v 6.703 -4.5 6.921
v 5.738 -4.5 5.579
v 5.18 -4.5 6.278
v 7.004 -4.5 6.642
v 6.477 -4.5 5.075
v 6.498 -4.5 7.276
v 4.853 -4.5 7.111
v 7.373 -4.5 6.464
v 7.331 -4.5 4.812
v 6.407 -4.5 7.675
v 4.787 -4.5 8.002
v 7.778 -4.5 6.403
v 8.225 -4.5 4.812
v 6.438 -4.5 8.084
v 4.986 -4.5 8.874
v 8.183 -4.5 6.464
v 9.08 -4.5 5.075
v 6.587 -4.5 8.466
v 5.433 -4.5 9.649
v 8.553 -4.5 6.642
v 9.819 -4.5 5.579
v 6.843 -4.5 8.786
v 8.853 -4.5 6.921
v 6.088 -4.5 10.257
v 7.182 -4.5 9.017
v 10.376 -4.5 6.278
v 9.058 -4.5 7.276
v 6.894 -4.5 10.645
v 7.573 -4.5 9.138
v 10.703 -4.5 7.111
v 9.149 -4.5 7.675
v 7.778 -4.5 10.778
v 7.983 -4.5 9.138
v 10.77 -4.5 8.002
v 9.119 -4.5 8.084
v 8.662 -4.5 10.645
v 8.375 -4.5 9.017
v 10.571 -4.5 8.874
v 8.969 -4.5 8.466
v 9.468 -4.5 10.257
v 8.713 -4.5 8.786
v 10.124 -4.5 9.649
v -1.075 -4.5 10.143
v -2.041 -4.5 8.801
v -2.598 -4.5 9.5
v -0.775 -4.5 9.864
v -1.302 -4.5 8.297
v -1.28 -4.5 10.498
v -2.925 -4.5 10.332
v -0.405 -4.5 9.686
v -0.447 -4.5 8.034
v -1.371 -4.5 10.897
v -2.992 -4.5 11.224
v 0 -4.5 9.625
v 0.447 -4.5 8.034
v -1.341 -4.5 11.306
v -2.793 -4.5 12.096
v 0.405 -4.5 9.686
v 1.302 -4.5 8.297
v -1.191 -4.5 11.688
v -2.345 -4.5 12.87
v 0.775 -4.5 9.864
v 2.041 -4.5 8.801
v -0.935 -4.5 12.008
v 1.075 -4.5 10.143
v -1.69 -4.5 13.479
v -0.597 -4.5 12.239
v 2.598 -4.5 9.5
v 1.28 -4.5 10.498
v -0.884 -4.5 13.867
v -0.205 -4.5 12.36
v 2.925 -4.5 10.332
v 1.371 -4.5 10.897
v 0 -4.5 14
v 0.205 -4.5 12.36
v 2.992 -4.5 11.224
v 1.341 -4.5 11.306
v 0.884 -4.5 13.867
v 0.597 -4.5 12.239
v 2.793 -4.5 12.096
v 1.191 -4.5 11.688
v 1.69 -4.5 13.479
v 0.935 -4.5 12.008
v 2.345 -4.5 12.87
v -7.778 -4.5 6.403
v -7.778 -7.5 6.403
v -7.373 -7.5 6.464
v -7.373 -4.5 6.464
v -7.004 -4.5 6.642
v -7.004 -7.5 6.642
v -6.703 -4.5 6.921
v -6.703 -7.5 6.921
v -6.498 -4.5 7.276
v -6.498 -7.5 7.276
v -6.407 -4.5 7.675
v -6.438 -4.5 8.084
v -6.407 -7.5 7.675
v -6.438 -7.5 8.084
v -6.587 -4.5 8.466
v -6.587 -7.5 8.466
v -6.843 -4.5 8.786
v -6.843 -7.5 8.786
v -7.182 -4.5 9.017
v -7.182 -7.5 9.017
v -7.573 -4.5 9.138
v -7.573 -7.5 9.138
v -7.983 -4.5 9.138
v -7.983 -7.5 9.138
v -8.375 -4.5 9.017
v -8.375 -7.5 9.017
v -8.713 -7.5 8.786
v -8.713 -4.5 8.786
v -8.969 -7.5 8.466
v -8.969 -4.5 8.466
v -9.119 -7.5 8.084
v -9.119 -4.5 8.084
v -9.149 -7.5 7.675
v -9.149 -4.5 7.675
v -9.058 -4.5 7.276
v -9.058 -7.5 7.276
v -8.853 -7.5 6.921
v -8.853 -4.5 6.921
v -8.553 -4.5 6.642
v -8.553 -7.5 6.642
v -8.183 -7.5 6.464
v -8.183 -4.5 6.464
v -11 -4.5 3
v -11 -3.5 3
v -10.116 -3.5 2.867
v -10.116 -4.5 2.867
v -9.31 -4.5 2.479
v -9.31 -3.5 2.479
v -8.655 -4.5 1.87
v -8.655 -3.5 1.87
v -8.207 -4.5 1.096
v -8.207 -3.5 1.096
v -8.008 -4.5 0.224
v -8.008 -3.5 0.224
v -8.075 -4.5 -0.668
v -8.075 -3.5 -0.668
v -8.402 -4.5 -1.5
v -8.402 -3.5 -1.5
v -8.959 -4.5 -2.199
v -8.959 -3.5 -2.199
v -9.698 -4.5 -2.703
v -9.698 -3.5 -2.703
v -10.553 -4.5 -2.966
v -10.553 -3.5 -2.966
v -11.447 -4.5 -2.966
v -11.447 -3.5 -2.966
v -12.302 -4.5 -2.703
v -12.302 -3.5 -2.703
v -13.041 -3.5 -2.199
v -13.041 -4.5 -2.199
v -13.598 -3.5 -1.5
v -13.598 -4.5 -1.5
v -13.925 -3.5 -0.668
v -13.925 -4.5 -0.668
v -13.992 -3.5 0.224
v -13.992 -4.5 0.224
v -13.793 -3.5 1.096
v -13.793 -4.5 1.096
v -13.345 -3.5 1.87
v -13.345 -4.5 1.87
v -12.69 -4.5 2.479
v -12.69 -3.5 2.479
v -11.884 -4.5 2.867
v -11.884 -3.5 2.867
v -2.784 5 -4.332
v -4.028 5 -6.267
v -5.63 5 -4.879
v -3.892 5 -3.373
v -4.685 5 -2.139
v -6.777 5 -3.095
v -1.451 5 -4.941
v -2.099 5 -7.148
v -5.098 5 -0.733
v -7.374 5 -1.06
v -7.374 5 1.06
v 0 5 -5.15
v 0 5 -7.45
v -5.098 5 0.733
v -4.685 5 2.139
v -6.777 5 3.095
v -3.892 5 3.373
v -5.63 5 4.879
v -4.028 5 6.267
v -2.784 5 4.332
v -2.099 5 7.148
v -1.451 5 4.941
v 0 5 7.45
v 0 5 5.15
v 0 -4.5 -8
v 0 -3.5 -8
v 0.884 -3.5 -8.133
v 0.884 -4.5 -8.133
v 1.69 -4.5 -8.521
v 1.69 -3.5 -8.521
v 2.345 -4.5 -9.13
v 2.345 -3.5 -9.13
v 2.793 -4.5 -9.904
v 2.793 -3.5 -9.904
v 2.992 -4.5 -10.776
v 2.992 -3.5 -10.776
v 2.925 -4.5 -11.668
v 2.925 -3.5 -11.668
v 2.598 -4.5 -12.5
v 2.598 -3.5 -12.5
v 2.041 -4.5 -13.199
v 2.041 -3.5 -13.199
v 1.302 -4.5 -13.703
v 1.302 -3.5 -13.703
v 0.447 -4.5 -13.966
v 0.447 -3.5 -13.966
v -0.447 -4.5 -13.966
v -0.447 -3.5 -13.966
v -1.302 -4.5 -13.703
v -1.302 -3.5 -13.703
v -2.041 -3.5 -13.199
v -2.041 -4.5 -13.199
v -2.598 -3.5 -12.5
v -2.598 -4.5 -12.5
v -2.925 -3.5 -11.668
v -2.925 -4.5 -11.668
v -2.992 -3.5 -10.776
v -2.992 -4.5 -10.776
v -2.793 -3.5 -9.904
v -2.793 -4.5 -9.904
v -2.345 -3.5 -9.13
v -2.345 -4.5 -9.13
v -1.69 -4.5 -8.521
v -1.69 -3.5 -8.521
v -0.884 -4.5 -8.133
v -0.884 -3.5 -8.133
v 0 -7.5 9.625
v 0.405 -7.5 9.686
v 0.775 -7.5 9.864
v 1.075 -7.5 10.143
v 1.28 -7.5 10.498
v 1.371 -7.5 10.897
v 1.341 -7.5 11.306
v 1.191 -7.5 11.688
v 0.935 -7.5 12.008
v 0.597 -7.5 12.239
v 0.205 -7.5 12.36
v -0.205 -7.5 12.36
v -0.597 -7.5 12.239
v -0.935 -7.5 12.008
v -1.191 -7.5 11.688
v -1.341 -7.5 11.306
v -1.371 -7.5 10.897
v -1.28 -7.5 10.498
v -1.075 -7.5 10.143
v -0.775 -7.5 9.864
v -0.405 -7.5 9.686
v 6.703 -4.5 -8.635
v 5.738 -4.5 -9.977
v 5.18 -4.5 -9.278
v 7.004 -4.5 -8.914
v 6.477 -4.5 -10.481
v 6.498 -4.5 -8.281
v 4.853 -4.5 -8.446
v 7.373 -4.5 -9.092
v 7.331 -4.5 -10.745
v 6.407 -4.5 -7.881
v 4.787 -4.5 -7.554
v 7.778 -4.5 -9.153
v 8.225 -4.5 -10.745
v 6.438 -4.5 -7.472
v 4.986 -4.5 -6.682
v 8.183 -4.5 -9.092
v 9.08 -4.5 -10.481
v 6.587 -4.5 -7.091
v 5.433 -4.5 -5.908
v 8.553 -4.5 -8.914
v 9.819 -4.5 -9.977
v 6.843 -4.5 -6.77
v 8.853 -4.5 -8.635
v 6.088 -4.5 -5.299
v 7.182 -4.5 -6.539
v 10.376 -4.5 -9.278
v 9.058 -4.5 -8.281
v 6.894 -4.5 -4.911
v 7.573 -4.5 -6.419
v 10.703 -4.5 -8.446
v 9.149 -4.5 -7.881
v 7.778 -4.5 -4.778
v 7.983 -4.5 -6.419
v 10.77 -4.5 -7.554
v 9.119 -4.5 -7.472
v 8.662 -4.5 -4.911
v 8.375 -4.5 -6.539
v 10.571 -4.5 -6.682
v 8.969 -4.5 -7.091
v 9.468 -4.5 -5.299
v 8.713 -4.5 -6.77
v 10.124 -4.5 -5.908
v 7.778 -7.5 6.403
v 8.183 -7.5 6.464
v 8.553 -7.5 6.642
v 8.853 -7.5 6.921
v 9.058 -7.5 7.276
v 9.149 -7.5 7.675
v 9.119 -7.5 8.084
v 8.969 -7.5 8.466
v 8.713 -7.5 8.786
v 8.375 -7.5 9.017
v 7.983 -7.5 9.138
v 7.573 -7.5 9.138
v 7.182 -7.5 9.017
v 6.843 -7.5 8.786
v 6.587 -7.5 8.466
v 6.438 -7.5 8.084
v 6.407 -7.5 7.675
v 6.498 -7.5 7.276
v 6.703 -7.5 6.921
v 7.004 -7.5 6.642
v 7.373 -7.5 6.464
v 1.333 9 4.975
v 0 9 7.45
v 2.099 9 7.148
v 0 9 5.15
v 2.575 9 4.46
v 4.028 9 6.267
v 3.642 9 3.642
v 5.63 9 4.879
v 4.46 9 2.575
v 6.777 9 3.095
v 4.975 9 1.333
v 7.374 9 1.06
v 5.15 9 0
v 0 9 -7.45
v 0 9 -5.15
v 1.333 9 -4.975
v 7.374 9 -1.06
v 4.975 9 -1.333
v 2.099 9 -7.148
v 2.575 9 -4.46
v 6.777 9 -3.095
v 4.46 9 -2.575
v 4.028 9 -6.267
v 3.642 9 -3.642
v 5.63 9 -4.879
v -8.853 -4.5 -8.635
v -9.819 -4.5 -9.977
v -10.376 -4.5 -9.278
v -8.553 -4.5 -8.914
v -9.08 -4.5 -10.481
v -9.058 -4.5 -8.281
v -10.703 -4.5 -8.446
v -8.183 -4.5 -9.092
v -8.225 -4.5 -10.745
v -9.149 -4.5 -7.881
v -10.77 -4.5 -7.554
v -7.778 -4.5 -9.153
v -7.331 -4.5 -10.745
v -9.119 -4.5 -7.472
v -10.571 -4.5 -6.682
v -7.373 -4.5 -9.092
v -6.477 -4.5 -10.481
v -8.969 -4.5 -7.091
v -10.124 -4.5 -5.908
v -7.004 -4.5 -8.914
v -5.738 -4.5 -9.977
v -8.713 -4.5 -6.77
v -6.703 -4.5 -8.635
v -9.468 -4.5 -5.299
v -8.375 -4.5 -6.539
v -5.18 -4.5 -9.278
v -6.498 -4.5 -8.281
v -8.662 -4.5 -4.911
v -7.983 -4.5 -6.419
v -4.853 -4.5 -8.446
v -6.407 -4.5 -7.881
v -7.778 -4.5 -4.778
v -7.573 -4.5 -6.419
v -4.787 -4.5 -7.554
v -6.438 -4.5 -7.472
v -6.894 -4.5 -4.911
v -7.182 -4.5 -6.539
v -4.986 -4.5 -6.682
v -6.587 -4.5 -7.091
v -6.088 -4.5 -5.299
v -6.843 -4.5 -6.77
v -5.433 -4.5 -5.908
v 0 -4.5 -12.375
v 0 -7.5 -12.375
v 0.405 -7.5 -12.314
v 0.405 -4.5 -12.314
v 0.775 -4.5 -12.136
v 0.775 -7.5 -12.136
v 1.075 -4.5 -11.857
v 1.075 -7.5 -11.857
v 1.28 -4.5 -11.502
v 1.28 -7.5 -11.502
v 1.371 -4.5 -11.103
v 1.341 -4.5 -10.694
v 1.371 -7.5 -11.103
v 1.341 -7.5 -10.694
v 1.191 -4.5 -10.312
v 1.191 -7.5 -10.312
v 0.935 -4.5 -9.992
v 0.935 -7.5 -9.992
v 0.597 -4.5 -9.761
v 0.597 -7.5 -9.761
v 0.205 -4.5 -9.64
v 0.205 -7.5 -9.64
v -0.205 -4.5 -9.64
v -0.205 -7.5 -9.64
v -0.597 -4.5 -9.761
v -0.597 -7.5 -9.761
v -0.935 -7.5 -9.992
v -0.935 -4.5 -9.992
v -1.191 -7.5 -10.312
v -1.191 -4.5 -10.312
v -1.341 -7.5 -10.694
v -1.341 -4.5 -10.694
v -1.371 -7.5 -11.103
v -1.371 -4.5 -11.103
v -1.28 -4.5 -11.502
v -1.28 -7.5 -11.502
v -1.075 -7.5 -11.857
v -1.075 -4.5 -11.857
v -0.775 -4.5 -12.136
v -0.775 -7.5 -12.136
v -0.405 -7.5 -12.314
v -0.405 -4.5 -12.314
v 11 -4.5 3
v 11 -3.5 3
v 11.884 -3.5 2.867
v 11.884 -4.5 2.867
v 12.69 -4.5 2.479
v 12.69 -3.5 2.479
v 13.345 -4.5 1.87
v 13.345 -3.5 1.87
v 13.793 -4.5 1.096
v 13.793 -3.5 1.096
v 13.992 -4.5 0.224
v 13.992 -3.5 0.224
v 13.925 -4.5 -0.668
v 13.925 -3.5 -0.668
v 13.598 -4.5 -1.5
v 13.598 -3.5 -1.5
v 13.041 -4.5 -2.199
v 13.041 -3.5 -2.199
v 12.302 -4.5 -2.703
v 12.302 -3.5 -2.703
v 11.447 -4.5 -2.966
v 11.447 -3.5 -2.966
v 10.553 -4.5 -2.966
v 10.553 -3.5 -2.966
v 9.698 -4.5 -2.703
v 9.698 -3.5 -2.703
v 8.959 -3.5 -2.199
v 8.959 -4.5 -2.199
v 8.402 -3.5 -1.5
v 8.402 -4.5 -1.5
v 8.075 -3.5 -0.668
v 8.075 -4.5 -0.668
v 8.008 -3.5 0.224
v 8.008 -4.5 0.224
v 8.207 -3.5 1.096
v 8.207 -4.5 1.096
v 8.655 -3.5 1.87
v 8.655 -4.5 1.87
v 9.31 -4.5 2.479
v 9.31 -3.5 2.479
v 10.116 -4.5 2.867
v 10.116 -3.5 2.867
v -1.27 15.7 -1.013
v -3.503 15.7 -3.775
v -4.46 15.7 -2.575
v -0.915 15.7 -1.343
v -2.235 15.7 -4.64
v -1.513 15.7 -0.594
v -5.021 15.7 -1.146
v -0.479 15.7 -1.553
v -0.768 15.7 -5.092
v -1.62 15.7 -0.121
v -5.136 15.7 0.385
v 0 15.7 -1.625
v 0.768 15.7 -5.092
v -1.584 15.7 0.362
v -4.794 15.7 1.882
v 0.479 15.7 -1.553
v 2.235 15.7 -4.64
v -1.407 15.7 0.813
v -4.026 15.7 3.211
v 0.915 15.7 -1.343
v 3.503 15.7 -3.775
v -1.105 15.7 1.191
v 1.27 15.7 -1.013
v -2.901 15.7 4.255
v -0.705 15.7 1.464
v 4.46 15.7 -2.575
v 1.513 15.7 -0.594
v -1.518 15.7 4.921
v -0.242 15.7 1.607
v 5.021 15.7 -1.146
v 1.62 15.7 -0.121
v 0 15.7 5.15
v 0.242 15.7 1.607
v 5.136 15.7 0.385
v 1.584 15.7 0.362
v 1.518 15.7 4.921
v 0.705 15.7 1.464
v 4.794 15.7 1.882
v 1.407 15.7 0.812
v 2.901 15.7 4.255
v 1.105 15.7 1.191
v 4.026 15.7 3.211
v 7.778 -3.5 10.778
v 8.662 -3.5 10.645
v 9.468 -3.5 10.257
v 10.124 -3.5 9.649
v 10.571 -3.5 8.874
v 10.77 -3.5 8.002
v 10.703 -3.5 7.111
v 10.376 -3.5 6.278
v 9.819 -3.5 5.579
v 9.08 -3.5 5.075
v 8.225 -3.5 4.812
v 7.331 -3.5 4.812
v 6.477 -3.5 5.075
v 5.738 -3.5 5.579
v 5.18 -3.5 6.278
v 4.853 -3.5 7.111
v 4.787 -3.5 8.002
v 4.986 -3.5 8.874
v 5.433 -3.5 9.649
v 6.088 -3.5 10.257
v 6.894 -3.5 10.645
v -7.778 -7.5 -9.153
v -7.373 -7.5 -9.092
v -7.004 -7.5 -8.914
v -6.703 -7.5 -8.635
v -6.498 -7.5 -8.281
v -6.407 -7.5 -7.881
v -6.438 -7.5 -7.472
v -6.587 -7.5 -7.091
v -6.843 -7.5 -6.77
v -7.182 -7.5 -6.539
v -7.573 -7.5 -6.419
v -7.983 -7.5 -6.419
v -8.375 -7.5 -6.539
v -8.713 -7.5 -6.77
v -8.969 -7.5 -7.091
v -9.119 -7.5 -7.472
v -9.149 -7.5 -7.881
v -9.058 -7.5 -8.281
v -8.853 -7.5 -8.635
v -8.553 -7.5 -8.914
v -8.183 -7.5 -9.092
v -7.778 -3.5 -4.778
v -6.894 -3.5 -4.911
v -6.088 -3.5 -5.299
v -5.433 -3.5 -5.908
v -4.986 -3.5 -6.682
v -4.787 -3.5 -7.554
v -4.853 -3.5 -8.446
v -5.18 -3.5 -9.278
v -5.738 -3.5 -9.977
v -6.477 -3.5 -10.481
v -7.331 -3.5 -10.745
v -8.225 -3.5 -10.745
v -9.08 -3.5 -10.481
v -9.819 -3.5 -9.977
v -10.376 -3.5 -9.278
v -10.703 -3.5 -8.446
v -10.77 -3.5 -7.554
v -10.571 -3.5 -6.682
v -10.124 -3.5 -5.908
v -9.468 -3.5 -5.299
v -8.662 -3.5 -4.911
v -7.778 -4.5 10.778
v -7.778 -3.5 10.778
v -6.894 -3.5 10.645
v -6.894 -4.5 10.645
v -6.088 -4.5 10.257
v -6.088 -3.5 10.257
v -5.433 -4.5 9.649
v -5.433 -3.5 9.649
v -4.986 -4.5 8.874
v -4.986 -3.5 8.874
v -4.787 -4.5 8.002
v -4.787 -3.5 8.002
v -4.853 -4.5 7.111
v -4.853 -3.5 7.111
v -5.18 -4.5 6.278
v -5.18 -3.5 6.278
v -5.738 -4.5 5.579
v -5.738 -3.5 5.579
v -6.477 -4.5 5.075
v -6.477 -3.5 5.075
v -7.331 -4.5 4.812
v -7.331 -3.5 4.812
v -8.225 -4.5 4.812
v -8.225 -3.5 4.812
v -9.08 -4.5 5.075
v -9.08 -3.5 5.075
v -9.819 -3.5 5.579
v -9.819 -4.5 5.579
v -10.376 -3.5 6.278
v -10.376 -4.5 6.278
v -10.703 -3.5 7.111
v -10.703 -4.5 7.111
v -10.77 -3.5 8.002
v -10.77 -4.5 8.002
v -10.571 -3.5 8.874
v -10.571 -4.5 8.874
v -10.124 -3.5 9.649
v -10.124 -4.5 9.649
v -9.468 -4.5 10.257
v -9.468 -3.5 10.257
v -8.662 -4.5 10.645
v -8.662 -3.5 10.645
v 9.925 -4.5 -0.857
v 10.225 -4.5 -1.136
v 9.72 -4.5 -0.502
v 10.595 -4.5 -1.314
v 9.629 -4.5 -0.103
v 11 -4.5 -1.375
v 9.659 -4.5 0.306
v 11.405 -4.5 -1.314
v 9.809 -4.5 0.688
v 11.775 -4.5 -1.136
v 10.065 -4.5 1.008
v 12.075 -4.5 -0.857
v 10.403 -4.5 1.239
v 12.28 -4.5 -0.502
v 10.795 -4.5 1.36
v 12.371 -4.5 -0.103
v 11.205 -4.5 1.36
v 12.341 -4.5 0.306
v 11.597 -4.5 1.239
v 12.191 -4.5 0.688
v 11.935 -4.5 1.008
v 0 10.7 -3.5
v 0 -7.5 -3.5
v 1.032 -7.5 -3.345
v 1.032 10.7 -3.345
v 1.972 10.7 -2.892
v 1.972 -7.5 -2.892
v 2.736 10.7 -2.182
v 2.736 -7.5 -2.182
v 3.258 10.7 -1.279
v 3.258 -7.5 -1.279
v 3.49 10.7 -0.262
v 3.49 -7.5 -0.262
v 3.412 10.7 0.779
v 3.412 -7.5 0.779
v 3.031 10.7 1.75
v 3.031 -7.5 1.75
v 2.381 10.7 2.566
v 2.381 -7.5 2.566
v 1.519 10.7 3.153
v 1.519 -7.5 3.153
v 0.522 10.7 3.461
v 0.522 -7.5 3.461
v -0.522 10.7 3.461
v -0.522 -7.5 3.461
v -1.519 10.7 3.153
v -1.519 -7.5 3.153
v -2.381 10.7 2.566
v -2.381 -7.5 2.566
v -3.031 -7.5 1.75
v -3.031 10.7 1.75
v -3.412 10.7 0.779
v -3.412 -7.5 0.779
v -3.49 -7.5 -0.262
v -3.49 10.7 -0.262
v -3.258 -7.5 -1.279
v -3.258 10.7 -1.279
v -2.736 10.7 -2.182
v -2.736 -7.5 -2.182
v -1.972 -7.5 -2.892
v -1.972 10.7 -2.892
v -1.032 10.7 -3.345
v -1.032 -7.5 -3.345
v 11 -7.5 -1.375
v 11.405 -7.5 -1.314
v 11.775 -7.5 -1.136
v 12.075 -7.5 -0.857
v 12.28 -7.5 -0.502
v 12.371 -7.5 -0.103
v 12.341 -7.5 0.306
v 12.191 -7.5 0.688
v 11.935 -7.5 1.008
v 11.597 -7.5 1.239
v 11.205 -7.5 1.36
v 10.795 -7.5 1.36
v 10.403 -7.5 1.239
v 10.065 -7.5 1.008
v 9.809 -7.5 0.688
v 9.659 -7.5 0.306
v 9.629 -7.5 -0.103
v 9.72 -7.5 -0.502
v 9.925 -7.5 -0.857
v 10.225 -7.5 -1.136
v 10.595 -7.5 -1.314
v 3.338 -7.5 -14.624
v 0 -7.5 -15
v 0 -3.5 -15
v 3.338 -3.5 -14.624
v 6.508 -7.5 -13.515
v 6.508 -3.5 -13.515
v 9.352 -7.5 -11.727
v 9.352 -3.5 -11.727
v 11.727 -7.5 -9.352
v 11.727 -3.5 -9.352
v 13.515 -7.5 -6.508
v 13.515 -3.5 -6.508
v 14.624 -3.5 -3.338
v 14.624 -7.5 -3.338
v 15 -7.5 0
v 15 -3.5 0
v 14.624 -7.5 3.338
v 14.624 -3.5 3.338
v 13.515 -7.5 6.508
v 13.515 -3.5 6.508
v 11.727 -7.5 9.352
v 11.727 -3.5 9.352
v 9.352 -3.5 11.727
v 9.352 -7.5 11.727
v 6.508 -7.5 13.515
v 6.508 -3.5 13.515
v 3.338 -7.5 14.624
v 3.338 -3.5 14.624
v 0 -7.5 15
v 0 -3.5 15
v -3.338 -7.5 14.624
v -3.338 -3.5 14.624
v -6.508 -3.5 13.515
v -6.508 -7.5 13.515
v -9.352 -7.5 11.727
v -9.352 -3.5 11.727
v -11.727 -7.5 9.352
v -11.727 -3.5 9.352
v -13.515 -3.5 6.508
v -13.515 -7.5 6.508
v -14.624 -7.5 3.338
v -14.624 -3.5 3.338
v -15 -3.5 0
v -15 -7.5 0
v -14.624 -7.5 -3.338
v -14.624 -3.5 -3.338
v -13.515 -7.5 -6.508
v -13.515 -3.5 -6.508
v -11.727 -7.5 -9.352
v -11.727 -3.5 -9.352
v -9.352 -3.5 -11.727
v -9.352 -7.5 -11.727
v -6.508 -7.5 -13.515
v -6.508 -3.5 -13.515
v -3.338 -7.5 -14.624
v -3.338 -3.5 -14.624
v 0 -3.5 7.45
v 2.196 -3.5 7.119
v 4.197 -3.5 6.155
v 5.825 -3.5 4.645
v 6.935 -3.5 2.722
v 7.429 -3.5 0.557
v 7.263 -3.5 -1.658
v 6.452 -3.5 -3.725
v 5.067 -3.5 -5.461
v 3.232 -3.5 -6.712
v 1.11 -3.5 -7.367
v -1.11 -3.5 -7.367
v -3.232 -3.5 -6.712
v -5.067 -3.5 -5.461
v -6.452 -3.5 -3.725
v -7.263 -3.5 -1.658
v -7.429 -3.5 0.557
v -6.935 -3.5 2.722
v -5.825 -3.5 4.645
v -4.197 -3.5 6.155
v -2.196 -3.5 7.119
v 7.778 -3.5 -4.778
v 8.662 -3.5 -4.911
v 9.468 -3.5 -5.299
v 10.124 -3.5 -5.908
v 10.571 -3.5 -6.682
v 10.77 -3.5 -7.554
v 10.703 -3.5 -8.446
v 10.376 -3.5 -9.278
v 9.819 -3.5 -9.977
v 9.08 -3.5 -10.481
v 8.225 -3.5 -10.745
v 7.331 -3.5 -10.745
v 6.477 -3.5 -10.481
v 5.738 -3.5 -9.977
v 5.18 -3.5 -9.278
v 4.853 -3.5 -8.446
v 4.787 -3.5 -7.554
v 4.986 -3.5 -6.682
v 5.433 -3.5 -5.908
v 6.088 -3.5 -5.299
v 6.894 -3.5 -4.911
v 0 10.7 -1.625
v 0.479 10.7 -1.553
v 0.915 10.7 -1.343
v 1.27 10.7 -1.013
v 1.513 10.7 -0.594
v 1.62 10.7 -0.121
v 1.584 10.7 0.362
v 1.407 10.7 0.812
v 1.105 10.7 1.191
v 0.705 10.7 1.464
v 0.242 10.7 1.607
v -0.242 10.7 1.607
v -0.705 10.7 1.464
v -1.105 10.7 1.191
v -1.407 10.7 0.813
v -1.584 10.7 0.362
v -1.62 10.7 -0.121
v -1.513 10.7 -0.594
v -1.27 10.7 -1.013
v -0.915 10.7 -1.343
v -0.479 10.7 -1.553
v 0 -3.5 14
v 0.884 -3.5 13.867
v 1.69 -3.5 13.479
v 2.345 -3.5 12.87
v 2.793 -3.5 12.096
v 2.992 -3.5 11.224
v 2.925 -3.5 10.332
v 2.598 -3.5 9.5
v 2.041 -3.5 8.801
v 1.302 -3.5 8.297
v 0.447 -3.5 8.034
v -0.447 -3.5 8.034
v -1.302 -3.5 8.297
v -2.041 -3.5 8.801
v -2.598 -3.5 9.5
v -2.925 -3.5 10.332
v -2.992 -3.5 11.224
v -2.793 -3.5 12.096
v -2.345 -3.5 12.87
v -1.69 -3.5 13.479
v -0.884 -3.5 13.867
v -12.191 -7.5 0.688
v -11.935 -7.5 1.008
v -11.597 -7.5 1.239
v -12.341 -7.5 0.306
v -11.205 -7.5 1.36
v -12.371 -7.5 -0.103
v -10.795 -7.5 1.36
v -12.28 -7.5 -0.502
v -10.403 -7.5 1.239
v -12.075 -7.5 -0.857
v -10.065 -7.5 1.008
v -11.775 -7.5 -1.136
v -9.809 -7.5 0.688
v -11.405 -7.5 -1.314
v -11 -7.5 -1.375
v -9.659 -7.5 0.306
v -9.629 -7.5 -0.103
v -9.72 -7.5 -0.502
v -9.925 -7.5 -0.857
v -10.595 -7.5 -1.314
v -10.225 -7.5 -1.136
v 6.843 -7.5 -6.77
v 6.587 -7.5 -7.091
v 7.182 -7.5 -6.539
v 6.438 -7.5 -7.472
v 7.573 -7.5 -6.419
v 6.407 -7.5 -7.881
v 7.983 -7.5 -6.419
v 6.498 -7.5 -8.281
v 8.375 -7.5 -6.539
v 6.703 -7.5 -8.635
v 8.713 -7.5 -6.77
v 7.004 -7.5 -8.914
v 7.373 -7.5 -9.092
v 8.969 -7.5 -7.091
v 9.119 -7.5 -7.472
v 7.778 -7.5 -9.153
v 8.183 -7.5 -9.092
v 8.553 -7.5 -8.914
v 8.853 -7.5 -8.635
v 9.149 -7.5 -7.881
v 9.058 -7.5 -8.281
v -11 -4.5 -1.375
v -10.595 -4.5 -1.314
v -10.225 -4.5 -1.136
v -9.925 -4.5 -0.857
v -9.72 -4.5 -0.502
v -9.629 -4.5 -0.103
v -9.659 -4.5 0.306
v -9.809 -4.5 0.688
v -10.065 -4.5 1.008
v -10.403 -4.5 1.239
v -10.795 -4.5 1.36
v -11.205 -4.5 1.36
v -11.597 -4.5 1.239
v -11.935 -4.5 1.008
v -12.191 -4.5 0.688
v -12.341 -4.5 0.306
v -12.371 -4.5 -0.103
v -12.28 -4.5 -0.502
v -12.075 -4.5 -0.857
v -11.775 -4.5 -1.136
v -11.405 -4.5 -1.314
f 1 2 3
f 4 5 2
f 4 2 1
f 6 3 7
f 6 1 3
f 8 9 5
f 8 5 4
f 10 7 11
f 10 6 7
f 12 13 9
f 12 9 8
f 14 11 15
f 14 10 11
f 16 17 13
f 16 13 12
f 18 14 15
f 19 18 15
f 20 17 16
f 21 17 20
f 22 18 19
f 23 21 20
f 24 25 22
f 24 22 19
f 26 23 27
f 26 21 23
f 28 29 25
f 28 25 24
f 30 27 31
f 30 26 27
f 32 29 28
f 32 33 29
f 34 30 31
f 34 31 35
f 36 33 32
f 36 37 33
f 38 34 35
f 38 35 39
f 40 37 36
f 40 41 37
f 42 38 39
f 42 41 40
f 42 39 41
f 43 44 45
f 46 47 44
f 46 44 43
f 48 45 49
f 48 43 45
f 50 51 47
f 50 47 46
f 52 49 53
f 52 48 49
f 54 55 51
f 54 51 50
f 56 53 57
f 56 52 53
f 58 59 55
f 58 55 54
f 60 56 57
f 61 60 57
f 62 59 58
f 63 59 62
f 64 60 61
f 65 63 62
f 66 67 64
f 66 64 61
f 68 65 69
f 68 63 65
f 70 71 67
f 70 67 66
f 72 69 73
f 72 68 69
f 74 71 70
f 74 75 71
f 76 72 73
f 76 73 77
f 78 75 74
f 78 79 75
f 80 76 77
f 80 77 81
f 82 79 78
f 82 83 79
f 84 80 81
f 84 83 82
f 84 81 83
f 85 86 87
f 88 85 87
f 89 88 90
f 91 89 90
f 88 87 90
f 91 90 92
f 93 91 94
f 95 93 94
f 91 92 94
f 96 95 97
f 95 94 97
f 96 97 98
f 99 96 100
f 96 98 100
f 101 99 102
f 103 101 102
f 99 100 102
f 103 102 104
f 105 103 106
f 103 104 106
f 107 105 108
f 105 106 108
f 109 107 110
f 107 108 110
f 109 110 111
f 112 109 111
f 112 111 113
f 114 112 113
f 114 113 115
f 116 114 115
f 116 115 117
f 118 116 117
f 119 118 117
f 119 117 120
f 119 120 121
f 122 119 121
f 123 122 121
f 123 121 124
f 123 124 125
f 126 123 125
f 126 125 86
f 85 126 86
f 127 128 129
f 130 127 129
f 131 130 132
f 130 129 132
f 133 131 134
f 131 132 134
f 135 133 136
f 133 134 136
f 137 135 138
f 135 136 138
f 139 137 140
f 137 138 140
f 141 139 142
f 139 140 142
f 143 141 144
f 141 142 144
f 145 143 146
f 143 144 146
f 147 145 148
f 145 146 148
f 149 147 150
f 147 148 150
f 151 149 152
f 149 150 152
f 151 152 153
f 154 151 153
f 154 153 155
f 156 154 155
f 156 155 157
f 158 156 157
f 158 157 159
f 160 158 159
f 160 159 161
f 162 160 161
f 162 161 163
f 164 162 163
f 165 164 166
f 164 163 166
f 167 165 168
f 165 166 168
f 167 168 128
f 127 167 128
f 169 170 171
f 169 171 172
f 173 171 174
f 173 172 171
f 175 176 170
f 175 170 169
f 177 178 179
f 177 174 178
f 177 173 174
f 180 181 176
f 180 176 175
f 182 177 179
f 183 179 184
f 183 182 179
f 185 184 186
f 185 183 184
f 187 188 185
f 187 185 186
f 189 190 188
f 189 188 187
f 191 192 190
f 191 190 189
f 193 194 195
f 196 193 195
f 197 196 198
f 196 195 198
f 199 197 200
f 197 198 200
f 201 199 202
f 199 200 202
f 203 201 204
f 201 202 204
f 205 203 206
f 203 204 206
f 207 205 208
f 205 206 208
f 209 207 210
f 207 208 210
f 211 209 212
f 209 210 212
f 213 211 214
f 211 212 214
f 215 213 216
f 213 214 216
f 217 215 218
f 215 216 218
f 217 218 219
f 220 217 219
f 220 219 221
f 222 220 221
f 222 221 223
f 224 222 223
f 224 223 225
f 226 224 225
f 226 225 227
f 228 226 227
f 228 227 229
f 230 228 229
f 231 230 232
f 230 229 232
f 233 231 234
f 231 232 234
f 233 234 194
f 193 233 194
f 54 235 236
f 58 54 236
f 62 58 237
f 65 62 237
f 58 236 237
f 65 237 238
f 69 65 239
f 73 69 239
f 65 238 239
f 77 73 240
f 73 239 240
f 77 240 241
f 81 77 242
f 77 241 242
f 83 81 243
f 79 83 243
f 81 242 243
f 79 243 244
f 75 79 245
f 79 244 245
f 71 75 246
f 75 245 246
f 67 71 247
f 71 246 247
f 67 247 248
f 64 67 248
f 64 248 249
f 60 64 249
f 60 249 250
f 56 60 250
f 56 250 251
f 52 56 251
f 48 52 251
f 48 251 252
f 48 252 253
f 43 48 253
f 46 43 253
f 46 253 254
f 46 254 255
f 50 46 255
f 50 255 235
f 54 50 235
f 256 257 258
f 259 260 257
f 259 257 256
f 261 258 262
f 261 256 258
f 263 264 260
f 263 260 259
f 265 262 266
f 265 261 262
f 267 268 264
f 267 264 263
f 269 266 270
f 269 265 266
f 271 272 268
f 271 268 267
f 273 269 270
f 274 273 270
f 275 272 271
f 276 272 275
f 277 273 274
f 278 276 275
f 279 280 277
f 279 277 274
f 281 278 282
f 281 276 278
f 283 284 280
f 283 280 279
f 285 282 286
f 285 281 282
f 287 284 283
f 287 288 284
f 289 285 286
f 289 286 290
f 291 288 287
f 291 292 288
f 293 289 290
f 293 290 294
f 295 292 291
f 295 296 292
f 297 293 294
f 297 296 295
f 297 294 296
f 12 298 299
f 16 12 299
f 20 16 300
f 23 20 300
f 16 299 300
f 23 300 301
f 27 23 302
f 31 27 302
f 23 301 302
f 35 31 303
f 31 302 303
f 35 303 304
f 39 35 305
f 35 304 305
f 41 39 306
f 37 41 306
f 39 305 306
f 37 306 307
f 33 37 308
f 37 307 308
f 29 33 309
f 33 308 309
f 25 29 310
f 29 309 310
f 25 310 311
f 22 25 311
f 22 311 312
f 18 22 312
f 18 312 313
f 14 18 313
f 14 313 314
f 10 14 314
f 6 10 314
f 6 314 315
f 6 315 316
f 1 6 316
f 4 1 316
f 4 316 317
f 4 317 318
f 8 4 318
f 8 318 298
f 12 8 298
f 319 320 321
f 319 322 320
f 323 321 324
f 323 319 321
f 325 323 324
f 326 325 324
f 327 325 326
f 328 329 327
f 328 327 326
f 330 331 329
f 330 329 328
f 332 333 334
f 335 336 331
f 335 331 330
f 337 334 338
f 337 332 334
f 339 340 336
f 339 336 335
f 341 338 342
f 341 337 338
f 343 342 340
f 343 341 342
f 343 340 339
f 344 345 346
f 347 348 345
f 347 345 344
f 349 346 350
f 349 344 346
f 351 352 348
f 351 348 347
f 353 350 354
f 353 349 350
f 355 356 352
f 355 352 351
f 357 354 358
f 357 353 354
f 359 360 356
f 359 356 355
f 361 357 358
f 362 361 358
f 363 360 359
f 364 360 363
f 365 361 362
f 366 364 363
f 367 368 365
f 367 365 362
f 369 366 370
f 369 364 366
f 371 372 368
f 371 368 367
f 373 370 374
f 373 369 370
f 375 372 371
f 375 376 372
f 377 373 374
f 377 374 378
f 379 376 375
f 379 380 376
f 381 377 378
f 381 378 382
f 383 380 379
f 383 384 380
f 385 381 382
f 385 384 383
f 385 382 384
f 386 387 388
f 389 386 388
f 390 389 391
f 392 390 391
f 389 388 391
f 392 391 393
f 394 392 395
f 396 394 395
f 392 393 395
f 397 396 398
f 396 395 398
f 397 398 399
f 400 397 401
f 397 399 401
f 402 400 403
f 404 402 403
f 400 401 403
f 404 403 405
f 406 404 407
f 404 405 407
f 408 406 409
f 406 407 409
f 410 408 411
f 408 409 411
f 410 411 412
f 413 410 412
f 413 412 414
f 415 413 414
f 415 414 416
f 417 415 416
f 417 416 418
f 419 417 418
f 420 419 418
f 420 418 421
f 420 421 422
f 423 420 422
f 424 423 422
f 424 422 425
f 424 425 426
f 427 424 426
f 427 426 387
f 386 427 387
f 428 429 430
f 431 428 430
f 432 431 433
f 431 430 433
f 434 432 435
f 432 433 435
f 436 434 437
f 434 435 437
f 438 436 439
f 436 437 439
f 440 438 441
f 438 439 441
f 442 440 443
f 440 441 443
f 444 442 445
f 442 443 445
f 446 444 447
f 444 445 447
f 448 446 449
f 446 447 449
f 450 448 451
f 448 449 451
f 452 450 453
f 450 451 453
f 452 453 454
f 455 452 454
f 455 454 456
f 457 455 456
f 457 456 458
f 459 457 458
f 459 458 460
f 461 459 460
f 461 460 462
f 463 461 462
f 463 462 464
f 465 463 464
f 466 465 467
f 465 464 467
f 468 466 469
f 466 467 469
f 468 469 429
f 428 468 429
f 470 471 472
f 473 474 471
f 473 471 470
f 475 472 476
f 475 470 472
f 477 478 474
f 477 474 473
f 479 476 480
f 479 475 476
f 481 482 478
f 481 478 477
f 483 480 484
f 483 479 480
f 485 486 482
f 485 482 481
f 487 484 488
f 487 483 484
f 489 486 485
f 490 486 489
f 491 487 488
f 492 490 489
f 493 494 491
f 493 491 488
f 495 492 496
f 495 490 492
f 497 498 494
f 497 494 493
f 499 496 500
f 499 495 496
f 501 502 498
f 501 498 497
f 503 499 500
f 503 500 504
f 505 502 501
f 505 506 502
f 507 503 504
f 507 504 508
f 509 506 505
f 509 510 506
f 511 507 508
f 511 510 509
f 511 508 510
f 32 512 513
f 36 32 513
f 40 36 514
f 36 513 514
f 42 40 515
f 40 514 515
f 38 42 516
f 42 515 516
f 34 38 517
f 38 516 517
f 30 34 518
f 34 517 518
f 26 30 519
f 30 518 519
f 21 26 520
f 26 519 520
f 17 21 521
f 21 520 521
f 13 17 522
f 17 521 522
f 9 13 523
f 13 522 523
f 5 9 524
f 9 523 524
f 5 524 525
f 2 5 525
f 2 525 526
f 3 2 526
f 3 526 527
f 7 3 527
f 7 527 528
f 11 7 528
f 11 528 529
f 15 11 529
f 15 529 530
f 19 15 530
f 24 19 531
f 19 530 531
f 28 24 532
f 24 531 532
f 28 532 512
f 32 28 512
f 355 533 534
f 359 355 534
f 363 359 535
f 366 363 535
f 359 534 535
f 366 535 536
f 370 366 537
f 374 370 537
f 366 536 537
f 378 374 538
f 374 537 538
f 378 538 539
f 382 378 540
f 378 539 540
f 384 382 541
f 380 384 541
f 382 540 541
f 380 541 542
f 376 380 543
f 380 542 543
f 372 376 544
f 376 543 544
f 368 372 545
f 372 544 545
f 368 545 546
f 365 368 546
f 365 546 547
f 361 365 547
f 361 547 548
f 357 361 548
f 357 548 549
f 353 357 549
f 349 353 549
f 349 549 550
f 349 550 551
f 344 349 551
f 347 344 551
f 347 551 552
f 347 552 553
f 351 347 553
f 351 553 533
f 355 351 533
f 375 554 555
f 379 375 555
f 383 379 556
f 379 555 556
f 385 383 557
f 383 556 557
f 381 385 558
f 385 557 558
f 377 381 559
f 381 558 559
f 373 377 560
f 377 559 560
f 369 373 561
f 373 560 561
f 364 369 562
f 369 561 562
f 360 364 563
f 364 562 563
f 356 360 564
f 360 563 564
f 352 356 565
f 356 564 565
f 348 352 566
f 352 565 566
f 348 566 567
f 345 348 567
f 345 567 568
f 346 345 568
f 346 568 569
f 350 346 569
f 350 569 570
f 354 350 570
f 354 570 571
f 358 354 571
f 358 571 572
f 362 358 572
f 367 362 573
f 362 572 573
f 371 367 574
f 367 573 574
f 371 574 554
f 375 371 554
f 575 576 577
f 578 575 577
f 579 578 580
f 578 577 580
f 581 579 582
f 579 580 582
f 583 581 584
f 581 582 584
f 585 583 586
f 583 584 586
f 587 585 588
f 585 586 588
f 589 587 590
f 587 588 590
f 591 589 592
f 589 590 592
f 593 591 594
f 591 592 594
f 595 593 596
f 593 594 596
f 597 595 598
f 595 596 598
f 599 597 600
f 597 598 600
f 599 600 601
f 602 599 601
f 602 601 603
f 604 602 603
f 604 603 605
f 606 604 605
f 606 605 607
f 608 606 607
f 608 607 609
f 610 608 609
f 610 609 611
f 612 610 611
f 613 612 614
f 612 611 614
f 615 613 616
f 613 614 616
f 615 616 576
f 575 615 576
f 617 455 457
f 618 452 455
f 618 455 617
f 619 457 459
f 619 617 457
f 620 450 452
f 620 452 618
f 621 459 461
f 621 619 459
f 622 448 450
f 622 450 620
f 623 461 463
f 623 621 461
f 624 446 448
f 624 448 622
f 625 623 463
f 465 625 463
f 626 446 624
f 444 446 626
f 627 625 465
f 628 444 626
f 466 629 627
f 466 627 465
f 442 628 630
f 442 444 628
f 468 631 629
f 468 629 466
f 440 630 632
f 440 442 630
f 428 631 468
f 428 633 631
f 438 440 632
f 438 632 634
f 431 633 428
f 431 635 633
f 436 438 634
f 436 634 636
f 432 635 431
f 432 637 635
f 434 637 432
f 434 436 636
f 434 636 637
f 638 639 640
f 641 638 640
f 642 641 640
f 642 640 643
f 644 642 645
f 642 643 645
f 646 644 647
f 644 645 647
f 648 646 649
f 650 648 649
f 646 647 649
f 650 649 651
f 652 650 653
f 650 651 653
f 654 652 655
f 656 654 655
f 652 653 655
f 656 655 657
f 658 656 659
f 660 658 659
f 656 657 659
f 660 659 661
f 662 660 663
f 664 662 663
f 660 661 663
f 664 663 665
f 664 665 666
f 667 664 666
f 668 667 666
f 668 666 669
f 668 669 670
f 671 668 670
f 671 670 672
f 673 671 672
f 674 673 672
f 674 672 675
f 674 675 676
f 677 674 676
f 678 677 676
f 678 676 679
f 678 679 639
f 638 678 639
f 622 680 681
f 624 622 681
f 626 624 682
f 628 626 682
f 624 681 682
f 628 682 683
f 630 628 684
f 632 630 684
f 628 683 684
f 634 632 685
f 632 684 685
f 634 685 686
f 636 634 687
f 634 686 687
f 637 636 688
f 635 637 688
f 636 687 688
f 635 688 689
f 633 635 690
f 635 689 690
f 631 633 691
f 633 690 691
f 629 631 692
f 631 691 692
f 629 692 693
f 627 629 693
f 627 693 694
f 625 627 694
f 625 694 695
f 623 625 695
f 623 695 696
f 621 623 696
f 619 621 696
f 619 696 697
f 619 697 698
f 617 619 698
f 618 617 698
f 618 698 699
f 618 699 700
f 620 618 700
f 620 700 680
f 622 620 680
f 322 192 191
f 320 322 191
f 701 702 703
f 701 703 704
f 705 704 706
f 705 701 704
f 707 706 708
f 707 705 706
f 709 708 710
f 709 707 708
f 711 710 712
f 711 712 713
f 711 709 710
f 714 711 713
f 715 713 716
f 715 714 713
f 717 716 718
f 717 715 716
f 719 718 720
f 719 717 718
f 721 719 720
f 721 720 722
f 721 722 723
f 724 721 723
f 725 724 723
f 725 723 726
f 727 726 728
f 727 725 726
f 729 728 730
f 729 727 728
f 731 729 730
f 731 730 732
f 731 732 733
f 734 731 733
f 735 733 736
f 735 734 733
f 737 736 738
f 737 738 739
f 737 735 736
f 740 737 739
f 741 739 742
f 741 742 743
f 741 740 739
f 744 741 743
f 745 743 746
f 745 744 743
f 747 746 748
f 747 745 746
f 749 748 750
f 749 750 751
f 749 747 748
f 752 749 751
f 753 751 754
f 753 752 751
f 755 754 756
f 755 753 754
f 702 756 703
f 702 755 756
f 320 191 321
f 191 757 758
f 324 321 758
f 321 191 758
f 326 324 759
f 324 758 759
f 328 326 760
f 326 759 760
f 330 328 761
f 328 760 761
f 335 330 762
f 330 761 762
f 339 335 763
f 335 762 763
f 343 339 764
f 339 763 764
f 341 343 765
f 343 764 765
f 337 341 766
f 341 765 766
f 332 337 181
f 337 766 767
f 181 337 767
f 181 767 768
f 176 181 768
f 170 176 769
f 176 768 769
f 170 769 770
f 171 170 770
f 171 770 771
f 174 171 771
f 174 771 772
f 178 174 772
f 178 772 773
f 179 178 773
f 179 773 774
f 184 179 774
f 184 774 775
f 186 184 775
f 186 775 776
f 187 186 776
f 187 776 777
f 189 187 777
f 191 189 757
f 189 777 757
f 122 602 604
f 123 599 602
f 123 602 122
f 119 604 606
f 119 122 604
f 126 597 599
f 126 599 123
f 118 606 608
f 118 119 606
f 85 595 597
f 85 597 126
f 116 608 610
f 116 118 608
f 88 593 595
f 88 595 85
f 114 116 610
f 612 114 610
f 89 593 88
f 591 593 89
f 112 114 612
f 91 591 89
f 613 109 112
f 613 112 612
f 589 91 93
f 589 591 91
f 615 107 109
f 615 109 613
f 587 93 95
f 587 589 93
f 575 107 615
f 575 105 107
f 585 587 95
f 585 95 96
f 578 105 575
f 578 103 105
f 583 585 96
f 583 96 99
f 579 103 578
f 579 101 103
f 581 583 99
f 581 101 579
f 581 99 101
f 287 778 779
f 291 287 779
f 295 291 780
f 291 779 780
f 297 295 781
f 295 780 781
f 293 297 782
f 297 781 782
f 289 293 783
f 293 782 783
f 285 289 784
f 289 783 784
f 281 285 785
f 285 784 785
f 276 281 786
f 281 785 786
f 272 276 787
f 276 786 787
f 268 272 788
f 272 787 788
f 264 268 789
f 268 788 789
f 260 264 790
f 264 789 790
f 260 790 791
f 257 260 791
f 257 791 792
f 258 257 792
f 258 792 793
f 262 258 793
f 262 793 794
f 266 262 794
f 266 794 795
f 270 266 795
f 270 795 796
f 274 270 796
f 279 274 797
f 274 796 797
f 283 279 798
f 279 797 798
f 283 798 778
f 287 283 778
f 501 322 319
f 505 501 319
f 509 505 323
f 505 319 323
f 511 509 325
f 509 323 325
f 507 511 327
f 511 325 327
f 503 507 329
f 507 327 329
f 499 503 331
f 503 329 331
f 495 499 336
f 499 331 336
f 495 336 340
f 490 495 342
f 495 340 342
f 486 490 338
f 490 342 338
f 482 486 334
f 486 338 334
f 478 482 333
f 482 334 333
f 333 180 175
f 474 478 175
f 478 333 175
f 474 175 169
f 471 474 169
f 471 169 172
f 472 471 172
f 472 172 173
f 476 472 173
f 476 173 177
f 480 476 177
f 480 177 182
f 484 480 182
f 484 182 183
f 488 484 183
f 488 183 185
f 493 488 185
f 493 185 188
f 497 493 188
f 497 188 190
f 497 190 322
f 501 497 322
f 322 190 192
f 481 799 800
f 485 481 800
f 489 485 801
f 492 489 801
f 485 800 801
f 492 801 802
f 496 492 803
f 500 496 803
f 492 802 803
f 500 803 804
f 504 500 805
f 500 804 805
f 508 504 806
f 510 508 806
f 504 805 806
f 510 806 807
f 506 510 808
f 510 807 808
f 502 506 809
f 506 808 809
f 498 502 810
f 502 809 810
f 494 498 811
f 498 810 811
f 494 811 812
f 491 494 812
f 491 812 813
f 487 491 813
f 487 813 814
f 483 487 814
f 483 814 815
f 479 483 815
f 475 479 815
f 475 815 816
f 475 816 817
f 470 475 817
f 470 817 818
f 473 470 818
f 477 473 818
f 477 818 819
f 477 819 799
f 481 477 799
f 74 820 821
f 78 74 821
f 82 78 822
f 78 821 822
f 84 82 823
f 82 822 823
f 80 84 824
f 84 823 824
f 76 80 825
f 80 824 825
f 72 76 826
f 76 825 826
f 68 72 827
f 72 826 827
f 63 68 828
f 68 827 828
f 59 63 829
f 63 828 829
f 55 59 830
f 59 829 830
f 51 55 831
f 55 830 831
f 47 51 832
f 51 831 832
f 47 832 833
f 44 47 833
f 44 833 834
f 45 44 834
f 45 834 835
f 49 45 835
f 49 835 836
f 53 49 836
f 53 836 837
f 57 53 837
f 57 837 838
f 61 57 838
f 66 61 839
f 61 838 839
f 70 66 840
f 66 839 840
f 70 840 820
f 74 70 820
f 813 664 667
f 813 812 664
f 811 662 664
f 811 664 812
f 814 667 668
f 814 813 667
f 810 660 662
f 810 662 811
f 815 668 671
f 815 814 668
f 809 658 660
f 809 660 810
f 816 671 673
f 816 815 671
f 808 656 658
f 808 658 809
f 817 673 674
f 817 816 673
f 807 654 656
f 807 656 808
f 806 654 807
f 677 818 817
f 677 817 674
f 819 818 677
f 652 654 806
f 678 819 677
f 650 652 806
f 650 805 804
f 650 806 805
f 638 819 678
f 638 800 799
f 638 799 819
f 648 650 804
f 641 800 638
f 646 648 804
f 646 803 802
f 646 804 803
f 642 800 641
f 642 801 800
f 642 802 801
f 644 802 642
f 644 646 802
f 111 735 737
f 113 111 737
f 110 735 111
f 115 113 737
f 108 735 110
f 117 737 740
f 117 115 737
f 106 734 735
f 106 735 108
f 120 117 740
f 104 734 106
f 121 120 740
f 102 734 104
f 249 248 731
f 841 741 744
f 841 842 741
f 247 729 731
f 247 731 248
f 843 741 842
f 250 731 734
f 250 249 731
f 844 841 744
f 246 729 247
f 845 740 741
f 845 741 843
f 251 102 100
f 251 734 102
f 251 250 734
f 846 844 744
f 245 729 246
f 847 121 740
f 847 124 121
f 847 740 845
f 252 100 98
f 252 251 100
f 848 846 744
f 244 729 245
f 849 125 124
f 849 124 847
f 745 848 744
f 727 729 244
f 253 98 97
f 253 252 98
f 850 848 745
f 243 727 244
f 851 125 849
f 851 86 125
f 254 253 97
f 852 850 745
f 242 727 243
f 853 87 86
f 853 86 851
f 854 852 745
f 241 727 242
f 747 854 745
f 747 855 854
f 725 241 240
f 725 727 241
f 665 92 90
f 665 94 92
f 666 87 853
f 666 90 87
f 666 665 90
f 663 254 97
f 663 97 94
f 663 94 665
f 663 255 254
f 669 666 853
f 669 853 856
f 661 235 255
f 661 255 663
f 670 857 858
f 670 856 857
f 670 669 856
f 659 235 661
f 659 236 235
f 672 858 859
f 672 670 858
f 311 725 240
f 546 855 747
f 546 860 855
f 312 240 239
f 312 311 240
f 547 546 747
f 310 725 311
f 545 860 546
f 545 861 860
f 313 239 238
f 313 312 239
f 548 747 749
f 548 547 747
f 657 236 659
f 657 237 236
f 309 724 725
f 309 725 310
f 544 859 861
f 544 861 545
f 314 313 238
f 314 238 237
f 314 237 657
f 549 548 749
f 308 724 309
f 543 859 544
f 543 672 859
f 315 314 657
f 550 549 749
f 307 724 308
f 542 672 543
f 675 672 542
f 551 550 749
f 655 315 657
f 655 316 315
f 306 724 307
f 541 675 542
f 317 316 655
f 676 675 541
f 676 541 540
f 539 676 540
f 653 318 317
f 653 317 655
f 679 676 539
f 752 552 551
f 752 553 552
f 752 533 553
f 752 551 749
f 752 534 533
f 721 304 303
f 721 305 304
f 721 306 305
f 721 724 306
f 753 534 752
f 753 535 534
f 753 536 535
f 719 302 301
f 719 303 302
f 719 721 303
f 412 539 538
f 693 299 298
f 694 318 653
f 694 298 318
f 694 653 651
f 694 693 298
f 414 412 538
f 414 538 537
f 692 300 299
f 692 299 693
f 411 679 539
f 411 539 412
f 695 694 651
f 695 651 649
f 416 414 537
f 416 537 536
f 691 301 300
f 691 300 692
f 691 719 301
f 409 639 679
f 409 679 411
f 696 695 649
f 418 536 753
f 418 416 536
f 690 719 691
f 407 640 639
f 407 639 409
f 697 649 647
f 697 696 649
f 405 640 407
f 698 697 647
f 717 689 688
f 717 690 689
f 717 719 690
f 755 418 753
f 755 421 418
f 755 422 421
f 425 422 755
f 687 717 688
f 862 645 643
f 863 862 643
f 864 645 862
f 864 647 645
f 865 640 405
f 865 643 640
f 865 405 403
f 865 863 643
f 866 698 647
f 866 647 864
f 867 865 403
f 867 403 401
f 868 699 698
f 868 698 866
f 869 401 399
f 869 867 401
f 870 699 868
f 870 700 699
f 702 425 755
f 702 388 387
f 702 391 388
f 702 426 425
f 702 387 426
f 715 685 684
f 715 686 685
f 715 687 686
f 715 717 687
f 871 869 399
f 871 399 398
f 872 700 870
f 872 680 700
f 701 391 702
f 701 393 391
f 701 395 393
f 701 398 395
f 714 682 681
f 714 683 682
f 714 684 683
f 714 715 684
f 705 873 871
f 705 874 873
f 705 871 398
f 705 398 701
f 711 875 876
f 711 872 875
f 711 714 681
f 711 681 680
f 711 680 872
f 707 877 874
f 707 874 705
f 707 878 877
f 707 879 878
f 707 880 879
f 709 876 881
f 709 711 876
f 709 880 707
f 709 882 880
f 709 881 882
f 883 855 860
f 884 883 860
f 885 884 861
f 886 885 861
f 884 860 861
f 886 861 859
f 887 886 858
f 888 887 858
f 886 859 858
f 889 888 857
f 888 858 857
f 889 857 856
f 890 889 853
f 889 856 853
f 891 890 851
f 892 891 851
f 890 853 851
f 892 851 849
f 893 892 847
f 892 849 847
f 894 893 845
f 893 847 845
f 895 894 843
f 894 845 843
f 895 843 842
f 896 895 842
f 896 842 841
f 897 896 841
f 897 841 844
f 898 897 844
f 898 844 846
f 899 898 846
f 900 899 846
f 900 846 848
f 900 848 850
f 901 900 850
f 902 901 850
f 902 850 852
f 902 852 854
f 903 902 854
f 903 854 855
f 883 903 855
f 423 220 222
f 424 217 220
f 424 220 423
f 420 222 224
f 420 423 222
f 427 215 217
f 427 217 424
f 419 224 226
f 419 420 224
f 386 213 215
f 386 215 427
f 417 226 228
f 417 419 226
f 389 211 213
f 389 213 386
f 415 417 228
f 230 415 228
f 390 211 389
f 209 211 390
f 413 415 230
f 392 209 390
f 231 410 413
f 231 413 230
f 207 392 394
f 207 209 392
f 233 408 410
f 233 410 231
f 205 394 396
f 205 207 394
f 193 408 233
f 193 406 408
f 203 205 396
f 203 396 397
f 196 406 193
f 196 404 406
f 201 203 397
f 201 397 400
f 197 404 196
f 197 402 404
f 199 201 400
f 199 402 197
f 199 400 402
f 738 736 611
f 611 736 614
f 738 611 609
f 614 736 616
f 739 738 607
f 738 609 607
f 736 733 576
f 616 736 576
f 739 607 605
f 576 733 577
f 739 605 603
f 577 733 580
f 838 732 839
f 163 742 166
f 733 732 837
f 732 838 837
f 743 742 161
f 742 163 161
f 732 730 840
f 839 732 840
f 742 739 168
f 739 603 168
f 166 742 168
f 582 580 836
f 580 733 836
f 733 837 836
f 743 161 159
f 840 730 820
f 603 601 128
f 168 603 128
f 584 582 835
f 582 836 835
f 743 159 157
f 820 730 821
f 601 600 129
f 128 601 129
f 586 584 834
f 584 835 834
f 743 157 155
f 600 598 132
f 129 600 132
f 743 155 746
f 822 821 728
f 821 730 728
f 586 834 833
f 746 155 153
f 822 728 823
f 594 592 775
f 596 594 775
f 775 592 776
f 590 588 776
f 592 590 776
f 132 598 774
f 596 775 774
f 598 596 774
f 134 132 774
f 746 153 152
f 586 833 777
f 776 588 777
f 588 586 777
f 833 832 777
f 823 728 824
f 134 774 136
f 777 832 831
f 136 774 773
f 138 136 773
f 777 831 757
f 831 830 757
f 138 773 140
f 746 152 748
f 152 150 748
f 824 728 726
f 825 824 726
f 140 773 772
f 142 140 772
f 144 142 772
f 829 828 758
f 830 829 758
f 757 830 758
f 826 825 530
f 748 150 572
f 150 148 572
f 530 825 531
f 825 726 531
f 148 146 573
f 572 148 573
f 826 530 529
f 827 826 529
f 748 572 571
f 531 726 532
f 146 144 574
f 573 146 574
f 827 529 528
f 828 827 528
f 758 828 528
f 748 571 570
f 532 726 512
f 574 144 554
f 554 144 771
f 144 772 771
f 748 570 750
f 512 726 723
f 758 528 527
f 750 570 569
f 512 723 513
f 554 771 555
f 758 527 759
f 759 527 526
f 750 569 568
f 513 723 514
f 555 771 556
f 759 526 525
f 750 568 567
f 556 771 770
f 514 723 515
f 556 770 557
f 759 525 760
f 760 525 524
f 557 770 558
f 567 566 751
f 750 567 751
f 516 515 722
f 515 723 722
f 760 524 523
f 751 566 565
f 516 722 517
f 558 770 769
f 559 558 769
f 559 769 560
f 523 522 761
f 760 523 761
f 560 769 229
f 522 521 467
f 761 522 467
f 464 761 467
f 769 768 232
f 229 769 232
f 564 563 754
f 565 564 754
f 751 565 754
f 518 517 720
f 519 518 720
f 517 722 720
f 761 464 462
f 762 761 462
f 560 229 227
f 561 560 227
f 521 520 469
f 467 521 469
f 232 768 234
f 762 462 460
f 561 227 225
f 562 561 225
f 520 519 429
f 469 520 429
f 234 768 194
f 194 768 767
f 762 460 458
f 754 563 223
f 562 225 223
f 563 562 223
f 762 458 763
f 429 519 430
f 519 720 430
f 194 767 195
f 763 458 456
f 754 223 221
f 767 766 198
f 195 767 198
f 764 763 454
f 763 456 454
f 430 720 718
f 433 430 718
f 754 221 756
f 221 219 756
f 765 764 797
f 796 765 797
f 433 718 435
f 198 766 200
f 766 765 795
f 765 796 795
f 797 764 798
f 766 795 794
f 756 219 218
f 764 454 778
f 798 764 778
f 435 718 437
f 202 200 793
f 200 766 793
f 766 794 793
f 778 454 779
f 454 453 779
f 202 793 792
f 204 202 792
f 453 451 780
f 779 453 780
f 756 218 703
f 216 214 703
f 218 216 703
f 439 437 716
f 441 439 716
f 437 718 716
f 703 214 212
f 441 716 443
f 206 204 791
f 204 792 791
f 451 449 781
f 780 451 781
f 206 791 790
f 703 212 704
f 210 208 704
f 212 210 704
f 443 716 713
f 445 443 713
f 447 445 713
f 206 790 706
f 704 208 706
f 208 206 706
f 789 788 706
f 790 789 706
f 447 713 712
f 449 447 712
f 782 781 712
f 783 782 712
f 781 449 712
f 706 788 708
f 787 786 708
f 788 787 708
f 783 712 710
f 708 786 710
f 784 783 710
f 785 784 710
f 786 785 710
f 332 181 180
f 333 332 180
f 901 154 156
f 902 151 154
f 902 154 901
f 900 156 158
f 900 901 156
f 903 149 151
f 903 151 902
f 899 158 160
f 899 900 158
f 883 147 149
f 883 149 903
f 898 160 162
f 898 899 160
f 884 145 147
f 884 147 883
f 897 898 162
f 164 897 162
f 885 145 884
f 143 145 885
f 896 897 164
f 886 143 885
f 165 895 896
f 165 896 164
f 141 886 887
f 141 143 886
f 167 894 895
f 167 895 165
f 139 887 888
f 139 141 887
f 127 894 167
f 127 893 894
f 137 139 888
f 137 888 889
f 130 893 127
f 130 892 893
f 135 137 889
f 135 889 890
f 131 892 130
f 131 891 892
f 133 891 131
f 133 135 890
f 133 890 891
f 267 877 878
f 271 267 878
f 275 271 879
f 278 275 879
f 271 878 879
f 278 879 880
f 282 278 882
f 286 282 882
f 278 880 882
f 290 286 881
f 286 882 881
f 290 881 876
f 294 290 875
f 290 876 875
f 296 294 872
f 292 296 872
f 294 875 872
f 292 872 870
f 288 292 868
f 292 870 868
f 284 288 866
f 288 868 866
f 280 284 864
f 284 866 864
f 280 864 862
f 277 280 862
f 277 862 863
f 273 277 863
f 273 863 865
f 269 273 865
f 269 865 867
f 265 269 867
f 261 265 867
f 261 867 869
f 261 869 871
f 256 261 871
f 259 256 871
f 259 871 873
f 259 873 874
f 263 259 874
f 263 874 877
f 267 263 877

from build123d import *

# Parameters (mm, degrees)
SKETCH1_R           = 7.5
BOSS_EXTRUDE1_DEPTH = 5
SKETCH1_3_R         = 5.15
BOSS_EXTRUDE2_DEPTH = 15.7
BOSS_EXTRUDE3_DEPTH = 4
SKETCH3_R           = 1.625
CUT_EXTRUDE1_DEPTH  = 37
SKETCH4_R           = 3.5
CUT_EXTRUDE2_DEPTH  = 10.7
BOSS_EXTRUDE4_START = 3.5
SKETCH5_R           = 7.5
SKETCH5_R_2         = 3.5
BOSS_EXTRUDE4_DEPTH = 3.5
BOSS_EXTRUDE5_START = 4
SKETCH6_R           = 15
SKETCH6_R_2         = 1.375
SKETCH6_R_3         = 3.5
BOSS_EXTRUDE5_DEPTH = 4
SKETCH7_R           = 3
CUT_EXTRUDE3_DEPTH  = 1
CUT_EXTRUDE4_START  = -12.5
SKETCH8_R           = 7.5
SKETCH8_R_2         = 7.45
CUT_EXTRUDE4_DEPTH  = 12.5


with BuildPart() as part:
    # Sketch1 → Boss-Extrude1 (new body)
    with BuildSketch(Plane(origin=(0, 0, 0), x_dir=(1, 0, 0), z_dir=(0, 1, 0))):
        Circle(SKETCH1_R)
    extrude(amount=BOSS_EXTRUDE1_DEPTH)

    # Sketch1<3> → Boss-Extrude2 (add)
    with BuildSketch(Plane(origin=(0, 0, 0), x_dir=(1, 0, 0), z_dir=(0, 1, 0))):
        Circle(SKETCH1_3_R)
    extrude(amount=BOSS_EXTRUDE2_DEPTH)

    # Sketch2 → Boss-Extrude3 (add)
    with BuildSketch(Plane(origin=(0, 5, 0), x_dir=(1, 0, 0), z_dir=(0, 1, 0))):
        with BuildLine():
            ThreePointArc((7.5, 0), (5.303300859, 5.303300859), (0, 7.5))
            Line((0, 7.5), (0, 5.15))
            ThreePointArc((0, 5.15), (3.641599923, 3.641599923), (5.15, 0))
            ThreePointArc((5.15, 0), (3.641599923, -3.641599923), (0, -5.15))
            Line((0, -5.15), (0, -7.5))
            ThreePointArc((0, -7.5), (5.303300859, -5.303300859), (7.5, 0))
        make_face()
    extrude(amount=BOSS_EXTRUDE3_DEPTH)

    # Sketch3 → Cut-Extrude1 (cut)
    with BuildSketch(Plane.XZ):
        Circle(SKETCH3_R)
    extrude(amount=-CUT_EXTRUDE1_DEPTH, mode=Mode.SUBTRACT)

    # Sketch4 → Cut-Extrude2 (cut)
    with BuildSketch(Plane.XZ):
        Circle(SKETCH4_R)
    extrude(amount=-CUT_EXTRUDE2_DEPTH, mode=Mode.SUBTRACT)

    # Sketch5 → Boss-Extrude4 (add)
    with BuildSketch(Plane.XZ.offset(BOSS_EXTRUDE4_START)):
        Circle(SKETCH5_R)
        Circle(SKETCH5_R_2, mode=Mode.SUBTRACT)
    extrude(amount=-BOSS_EXTRUDE4_DEPTH)

    # Sketch6 → Boss-Extrude5 (add)
    with BuildSketch(Plane.XZ.offset(3.5).offset(BOSS_EXTRUDE5_START)):
        Circle(SKETCH6_R)
        with Locations((11, 0)):
            Circle(SKETCH6_R_2, mode=Mode.SUBTRACT)
        with Locations((7.778174593, -7.778174593)):
            Circle(SKETCH6_R_2, mode=Mode.SUBTRACT)
        with Locations((0, -11)):
            Circle(SKETCH6_R_2, mode=Mode.SUBTRACT)
        with Locations((-7.778174593, -7.778174593)):
            Circle(SKETCH6_R_2, mode=Mode.SUBTRACT)
        with Locations((-11, 0)):
            Circle(SKETCH6_R_2, mode=Mode.SUBTRACT)
        with Locations((-7.778174593, 7.778174593)):
            Circle(SKETCH6_R_2, mode=Mode.SUBTRACT)
        with Locations((0, 11)):
            Circle(SKETCH6_R_2, mode=Mode.SUBTRACT)
        with Locations((7.778174593, 7.778174593)):
            Circle(SKETCH6_R_2, mode=Mode.SUBTRACT)
        Circle(SKETCH6_R_3, mode=Mode.SUBTRACT)
    extrude(amount=-BOSS_EXTRUDE5_DEPTH)

    # Sketch7 → Cut-Extrude3 (cut)
    with BuildSketch(Plane(origin=(0, -3.5, 0), x_dir=(1, 0, 0), z_dir=(0, 1, 0))):
        with Locations((-11, 0)):
            Circle(SKETCH7_R)
        with Locations((-7.778174593, 7.778174593)):
            Circle(SKETCH7_R)
        with Locations((0, 11)):
            Circle(SKETCH7_R)
        with Locations((7.778174593, 7.778174593)):
            Circle(SKETCH7_R)
        with Locations((11, 0)):
            Circle(SKETCH7_R)
        with Locations((7.778174593, -7.778174593)):
            Circle(SKETCH7_R)
        with Locations((0, -11)):
            Circle(SKETCH7_R)
        with Locations((-7.778174593, -7.778174593)):
            Circle(SKETCH7_R)
    extrude(amount=-CUT_EXTRUDE3_DEPTH, mode=Mode.SUBTRACT)

    # Sketch8 → Cut-Extrude4 (cut)
    with BuildSketch(Plane(origin=(0, 9, 0), x_dir=(1, 0, 0), z_dir=(0, 1, 0)).offset(CUT_EXTRUDE4_START)):
        Circle(SKETCH8_R)
        Circle(SKETCH8_R_2, mode=Mode.SUBTRACT)
    extrude(amount=CUT_EXTRUDE4_DEPTH, mode=Mode.SUBTRACT)


solid = part.part
